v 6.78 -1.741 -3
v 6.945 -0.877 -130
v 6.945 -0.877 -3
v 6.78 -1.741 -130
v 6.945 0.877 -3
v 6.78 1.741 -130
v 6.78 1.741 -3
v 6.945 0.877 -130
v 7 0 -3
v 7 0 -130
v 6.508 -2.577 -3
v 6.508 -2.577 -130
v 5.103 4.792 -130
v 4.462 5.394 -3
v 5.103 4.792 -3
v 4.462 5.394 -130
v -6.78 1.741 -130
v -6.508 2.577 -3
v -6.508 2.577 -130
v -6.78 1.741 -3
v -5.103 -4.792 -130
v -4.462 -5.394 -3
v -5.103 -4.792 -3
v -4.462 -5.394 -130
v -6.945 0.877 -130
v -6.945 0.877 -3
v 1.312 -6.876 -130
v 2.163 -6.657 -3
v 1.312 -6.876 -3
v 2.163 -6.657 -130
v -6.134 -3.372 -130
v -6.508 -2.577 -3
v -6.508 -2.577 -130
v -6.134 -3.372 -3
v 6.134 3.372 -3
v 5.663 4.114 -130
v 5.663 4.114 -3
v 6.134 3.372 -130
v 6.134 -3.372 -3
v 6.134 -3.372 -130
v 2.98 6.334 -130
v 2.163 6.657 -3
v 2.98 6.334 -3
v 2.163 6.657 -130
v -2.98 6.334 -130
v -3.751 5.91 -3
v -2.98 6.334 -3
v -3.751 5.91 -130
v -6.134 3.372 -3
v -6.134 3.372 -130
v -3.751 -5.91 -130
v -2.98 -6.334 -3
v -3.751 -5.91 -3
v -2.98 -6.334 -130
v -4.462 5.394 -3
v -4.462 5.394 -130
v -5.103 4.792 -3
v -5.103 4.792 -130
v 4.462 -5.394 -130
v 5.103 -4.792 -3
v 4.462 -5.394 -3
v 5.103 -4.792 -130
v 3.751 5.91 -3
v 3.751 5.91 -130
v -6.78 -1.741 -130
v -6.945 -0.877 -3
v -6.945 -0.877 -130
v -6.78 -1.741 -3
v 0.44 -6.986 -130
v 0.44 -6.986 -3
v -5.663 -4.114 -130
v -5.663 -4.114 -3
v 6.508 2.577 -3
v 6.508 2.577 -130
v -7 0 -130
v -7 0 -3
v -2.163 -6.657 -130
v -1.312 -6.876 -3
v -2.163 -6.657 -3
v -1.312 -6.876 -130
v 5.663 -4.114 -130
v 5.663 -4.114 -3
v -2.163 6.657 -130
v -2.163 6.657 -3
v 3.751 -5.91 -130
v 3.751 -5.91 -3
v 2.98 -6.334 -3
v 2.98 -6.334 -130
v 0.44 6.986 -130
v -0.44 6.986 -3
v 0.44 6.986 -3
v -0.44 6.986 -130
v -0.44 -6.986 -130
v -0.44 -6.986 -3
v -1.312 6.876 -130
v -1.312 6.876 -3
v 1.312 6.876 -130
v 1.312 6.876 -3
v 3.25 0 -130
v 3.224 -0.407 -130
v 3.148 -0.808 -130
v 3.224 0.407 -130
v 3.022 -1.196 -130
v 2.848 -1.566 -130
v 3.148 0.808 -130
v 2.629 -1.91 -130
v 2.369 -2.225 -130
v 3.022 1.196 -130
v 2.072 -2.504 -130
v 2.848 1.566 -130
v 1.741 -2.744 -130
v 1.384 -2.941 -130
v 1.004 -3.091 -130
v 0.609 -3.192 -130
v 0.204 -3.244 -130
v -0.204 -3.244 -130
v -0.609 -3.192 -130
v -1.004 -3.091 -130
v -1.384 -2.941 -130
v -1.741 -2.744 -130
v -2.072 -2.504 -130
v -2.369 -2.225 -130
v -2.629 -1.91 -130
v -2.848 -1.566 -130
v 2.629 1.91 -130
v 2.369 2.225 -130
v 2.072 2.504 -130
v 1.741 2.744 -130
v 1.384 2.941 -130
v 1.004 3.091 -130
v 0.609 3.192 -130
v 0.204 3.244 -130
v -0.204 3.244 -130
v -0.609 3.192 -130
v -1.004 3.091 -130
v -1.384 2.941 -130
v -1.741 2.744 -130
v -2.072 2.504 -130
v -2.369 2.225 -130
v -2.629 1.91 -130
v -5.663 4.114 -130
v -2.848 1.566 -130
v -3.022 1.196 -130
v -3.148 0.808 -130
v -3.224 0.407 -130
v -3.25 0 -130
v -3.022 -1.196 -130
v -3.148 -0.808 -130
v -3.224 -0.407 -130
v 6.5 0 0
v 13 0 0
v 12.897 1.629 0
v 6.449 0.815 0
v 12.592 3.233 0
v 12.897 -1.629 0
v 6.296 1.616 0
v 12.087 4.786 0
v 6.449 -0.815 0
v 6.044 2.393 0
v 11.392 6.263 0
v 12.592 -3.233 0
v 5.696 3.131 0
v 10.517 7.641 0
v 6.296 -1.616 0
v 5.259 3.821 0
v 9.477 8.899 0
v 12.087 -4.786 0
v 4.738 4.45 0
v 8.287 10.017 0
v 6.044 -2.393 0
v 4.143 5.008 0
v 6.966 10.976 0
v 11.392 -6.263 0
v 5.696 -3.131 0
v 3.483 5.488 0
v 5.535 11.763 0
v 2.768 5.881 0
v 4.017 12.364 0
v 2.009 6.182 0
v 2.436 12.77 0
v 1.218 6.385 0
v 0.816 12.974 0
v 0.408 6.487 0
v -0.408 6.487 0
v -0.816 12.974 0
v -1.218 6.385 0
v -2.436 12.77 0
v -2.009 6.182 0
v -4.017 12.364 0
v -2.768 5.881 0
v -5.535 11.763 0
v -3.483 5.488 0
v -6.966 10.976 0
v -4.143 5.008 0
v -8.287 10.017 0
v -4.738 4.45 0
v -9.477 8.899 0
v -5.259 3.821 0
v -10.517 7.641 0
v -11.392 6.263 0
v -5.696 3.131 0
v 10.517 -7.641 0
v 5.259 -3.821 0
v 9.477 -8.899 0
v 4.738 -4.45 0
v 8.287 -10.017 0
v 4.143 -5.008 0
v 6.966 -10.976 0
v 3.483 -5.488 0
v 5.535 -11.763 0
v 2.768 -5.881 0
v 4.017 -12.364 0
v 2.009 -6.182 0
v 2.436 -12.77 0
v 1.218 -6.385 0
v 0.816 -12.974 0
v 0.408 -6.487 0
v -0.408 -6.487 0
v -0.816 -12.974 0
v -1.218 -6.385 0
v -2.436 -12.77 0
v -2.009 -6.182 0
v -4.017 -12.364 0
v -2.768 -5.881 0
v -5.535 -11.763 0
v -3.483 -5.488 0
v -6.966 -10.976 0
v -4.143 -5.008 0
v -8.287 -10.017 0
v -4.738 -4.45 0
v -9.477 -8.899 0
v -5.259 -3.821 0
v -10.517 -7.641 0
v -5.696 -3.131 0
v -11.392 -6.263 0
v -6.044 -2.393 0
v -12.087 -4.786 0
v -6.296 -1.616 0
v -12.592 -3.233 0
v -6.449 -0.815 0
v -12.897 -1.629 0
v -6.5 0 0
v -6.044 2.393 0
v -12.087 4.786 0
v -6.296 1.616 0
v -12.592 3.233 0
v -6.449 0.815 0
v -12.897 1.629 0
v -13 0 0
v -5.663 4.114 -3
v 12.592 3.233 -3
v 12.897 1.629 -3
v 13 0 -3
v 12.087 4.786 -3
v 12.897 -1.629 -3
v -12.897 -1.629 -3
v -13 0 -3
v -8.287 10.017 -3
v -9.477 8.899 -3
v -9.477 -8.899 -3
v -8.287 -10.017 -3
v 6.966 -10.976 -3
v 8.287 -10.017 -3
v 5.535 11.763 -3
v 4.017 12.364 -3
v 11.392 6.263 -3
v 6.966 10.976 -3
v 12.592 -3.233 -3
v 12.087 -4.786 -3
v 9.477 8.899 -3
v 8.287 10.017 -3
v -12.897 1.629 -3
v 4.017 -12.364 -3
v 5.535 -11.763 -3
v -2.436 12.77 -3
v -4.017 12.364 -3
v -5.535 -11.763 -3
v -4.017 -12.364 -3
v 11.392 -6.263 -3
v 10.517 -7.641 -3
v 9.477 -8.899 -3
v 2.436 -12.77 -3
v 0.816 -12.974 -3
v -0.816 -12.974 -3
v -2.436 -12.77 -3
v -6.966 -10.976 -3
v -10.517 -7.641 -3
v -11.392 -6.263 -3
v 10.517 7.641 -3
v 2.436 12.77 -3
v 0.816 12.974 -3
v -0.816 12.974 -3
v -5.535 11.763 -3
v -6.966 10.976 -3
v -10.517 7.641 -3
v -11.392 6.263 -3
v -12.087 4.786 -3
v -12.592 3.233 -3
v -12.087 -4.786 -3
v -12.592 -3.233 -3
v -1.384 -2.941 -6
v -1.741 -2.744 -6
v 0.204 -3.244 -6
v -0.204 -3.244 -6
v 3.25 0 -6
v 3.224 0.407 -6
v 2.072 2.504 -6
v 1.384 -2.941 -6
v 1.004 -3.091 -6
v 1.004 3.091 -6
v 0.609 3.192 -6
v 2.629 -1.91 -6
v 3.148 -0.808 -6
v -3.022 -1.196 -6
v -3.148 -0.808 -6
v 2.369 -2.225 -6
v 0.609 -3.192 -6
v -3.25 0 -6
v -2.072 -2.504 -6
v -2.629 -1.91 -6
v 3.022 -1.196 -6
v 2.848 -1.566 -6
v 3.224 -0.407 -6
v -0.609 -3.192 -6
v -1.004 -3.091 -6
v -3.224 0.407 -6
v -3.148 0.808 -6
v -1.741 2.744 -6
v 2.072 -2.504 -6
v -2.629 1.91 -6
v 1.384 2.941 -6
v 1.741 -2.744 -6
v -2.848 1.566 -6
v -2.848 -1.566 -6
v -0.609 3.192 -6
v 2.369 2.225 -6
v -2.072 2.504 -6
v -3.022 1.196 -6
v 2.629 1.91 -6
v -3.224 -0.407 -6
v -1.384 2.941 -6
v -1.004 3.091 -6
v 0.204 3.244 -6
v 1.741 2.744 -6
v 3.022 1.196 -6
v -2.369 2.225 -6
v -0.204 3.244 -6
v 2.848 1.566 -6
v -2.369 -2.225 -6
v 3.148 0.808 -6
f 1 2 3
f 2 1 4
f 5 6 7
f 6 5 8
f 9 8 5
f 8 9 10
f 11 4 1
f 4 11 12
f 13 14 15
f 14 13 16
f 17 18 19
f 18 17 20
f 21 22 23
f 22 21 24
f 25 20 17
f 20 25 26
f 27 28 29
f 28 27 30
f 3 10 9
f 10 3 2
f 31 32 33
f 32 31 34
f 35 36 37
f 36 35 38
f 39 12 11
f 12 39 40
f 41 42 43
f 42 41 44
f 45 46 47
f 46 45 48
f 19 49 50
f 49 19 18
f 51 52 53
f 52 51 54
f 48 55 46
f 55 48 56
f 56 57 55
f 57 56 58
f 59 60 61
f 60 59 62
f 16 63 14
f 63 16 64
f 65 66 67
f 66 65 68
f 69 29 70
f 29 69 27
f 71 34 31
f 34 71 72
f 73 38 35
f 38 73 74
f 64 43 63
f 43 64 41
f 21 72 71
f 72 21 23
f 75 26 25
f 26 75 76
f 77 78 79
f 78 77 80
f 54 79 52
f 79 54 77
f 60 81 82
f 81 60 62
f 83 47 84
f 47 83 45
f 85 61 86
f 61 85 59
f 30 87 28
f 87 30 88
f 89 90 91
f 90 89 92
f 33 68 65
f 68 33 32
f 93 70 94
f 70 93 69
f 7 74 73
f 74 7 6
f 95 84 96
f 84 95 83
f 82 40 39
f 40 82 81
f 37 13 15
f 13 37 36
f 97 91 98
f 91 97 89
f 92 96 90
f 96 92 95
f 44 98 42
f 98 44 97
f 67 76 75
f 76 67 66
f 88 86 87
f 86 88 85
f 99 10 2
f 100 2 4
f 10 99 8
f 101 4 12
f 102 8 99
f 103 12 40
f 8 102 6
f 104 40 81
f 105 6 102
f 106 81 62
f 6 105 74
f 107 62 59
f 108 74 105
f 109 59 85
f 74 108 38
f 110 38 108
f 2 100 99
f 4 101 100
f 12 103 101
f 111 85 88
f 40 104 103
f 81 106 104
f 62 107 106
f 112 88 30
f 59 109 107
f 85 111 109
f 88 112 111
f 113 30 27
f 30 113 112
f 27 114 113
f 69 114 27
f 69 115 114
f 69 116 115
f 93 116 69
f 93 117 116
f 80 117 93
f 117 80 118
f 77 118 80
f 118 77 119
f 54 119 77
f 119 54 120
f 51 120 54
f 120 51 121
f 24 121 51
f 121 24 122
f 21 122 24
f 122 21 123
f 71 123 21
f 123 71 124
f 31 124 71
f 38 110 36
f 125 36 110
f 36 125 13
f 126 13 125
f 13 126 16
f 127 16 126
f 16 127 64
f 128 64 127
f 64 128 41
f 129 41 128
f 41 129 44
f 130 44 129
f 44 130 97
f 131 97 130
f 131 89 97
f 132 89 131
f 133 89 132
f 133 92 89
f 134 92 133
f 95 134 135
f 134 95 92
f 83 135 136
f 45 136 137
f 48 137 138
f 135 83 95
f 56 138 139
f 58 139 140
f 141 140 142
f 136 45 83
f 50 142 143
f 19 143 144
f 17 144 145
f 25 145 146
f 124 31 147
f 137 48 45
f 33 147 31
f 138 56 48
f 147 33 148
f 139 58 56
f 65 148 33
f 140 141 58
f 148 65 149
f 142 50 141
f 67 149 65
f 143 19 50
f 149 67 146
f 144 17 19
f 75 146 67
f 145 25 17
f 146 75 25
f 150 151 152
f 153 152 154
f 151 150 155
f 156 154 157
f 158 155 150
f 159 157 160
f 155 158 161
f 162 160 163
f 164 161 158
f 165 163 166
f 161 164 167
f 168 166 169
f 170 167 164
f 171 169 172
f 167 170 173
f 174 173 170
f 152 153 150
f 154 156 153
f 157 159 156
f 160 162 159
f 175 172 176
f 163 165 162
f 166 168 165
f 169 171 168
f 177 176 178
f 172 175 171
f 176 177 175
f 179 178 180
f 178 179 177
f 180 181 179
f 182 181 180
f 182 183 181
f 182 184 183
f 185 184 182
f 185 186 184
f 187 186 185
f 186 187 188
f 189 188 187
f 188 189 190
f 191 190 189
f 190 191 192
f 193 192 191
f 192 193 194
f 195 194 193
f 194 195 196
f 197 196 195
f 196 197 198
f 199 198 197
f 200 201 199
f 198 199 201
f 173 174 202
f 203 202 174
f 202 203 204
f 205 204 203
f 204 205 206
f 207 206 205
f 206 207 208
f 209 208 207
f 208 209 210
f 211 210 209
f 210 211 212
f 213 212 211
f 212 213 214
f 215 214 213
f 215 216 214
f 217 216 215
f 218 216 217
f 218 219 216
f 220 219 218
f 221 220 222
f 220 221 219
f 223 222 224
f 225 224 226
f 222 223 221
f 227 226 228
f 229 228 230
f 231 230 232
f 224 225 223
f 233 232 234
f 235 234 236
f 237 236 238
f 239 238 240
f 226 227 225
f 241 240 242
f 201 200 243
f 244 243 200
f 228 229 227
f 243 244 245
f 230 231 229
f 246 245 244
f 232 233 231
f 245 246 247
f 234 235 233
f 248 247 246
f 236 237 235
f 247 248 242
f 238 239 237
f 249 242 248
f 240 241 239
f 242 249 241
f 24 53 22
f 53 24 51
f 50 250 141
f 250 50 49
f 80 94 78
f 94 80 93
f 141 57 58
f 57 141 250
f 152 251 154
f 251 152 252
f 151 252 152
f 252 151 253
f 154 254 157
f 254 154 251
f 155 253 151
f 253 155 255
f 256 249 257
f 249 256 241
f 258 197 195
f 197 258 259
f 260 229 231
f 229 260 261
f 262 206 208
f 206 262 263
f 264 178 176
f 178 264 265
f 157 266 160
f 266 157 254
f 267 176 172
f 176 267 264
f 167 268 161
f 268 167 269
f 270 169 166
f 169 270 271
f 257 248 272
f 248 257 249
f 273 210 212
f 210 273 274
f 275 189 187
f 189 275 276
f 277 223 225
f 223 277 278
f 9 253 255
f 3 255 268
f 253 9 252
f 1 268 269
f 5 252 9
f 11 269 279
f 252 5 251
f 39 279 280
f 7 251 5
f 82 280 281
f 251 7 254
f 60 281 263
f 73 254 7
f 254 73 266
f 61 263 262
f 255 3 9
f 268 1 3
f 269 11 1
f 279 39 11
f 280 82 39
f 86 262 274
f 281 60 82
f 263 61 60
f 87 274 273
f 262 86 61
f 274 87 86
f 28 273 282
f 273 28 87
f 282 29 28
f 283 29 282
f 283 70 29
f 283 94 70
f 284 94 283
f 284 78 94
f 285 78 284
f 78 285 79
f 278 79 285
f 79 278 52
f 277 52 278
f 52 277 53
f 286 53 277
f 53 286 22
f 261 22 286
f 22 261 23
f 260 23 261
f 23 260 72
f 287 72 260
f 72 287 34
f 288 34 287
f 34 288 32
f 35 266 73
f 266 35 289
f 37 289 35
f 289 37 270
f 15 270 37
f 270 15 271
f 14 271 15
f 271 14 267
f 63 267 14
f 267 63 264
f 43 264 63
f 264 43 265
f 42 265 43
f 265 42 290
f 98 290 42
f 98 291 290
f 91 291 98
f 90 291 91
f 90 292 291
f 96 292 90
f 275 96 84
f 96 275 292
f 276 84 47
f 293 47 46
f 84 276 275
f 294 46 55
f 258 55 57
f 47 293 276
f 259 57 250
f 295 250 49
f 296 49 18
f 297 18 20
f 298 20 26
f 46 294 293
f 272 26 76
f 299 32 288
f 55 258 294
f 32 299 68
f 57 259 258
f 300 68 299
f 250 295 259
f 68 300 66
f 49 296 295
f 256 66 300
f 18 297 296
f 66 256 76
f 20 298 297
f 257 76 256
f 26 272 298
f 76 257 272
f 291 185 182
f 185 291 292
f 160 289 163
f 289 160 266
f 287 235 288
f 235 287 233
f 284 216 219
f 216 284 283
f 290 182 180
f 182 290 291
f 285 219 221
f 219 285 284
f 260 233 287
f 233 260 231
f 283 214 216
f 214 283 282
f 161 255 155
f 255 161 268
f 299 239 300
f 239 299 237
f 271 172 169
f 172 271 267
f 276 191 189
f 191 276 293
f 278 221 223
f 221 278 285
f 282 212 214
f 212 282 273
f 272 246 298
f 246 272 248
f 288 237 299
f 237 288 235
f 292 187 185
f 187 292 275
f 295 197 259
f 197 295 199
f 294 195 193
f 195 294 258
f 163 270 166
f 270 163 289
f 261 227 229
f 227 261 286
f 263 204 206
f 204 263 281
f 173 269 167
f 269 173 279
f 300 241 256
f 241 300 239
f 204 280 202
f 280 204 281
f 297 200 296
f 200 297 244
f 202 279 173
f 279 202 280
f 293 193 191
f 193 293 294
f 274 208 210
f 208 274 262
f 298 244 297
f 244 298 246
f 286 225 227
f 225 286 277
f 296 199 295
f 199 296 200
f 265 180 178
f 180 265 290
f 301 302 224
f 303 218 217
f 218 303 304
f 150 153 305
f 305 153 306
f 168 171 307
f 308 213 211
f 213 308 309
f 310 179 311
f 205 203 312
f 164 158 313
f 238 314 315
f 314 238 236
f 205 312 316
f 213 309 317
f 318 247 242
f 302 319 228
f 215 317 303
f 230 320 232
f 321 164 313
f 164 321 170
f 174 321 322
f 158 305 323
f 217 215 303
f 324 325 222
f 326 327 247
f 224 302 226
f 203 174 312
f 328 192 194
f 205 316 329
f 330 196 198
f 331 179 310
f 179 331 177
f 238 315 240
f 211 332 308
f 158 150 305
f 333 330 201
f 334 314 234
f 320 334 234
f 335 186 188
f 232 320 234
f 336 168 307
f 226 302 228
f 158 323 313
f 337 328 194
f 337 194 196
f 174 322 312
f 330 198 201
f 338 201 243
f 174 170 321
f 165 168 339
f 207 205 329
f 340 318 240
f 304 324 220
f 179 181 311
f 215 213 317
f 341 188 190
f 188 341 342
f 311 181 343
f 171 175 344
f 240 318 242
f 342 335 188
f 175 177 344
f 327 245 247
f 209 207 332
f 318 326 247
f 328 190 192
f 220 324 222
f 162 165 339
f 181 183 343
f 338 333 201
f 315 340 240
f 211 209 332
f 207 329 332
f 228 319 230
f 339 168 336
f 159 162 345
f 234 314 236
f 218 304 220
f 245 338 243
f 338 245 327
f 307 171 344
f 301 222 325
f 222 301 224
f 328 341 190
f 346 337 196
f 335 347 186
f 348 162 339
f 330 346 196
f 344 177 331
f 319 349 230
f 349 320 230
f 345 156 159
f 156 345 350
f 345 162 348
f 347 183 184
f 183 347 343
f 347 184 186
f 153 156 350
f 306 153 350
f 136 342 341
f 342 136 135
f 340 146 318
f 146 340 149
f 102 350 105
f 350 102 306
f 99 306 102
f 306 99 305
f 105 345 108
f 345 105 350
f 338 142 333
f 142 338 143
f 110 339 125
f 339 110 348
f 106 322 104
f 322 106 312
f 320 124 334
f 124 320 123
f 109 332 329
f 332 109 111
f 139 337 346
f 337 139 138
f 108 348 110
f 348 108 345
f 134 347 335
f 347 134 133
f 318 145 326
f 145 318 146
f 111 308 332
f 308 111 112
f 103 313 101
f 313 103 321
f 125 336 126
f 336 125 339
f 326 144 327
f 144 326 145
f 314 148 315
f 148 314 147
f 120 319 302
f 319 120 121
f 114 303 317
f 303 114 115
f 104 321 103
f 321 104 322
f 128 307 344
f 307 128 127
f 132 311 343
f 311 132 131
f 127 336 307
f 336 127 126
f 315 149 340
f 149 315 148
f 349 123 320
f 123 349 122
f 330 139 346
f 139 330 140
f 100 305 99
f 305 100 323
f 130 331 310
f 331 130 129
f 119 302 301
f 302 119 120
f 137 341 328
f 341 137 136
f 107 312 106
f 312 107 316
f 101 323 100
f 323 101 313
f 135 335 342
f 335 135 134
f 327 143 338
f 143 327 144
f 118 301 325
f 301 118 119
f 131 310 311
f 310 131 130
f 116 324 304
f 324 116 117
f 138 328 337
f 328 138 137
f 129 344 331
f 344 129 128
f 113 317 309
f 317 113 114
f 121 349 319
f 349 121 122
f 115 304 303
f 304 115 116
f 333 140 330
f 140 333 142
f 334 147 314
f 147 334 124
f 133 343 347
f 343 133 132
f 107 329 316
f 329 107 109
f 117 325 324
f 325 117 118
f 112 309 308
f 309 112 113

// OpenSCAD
$fn = 50;


difference() {
	union() {
		translate(v = [0, 0, -130.0000000000]) {
			cylinder(h = 130, r = 7.0000000000);
		}
		translate(v = [0, 0, -3.0000000000]) {
			cylinder(h = 3, r = 13.0000000000);
		}
	}
	union() {
		translate(v = [0, 0, 0]) {
			rotate(a = [0, 0, 0]) {
				difference() {
					union() {
						#translate(v = [0, 0, -130.0000000000]) {
							cylinder(h = 130, r = 2.2500000000);
						}
						#translate(v = [0, 0, -6]) {
							cylinder(h = 6, r = 7.0000000000, r1 = 3.2500000000, r2 = 6.5000000000);
						}
						#translate(v = [0, 0, -130.0000000000]) {
							cylinder(h = 130, r = 3.2500000000);
						}
						#translate(v = [0, 0, -130.0000000000]) {
							cylinder(h = 130, r = 2.2500000000);
						}
					}
					union();
				}
			}
		}
	}
}
